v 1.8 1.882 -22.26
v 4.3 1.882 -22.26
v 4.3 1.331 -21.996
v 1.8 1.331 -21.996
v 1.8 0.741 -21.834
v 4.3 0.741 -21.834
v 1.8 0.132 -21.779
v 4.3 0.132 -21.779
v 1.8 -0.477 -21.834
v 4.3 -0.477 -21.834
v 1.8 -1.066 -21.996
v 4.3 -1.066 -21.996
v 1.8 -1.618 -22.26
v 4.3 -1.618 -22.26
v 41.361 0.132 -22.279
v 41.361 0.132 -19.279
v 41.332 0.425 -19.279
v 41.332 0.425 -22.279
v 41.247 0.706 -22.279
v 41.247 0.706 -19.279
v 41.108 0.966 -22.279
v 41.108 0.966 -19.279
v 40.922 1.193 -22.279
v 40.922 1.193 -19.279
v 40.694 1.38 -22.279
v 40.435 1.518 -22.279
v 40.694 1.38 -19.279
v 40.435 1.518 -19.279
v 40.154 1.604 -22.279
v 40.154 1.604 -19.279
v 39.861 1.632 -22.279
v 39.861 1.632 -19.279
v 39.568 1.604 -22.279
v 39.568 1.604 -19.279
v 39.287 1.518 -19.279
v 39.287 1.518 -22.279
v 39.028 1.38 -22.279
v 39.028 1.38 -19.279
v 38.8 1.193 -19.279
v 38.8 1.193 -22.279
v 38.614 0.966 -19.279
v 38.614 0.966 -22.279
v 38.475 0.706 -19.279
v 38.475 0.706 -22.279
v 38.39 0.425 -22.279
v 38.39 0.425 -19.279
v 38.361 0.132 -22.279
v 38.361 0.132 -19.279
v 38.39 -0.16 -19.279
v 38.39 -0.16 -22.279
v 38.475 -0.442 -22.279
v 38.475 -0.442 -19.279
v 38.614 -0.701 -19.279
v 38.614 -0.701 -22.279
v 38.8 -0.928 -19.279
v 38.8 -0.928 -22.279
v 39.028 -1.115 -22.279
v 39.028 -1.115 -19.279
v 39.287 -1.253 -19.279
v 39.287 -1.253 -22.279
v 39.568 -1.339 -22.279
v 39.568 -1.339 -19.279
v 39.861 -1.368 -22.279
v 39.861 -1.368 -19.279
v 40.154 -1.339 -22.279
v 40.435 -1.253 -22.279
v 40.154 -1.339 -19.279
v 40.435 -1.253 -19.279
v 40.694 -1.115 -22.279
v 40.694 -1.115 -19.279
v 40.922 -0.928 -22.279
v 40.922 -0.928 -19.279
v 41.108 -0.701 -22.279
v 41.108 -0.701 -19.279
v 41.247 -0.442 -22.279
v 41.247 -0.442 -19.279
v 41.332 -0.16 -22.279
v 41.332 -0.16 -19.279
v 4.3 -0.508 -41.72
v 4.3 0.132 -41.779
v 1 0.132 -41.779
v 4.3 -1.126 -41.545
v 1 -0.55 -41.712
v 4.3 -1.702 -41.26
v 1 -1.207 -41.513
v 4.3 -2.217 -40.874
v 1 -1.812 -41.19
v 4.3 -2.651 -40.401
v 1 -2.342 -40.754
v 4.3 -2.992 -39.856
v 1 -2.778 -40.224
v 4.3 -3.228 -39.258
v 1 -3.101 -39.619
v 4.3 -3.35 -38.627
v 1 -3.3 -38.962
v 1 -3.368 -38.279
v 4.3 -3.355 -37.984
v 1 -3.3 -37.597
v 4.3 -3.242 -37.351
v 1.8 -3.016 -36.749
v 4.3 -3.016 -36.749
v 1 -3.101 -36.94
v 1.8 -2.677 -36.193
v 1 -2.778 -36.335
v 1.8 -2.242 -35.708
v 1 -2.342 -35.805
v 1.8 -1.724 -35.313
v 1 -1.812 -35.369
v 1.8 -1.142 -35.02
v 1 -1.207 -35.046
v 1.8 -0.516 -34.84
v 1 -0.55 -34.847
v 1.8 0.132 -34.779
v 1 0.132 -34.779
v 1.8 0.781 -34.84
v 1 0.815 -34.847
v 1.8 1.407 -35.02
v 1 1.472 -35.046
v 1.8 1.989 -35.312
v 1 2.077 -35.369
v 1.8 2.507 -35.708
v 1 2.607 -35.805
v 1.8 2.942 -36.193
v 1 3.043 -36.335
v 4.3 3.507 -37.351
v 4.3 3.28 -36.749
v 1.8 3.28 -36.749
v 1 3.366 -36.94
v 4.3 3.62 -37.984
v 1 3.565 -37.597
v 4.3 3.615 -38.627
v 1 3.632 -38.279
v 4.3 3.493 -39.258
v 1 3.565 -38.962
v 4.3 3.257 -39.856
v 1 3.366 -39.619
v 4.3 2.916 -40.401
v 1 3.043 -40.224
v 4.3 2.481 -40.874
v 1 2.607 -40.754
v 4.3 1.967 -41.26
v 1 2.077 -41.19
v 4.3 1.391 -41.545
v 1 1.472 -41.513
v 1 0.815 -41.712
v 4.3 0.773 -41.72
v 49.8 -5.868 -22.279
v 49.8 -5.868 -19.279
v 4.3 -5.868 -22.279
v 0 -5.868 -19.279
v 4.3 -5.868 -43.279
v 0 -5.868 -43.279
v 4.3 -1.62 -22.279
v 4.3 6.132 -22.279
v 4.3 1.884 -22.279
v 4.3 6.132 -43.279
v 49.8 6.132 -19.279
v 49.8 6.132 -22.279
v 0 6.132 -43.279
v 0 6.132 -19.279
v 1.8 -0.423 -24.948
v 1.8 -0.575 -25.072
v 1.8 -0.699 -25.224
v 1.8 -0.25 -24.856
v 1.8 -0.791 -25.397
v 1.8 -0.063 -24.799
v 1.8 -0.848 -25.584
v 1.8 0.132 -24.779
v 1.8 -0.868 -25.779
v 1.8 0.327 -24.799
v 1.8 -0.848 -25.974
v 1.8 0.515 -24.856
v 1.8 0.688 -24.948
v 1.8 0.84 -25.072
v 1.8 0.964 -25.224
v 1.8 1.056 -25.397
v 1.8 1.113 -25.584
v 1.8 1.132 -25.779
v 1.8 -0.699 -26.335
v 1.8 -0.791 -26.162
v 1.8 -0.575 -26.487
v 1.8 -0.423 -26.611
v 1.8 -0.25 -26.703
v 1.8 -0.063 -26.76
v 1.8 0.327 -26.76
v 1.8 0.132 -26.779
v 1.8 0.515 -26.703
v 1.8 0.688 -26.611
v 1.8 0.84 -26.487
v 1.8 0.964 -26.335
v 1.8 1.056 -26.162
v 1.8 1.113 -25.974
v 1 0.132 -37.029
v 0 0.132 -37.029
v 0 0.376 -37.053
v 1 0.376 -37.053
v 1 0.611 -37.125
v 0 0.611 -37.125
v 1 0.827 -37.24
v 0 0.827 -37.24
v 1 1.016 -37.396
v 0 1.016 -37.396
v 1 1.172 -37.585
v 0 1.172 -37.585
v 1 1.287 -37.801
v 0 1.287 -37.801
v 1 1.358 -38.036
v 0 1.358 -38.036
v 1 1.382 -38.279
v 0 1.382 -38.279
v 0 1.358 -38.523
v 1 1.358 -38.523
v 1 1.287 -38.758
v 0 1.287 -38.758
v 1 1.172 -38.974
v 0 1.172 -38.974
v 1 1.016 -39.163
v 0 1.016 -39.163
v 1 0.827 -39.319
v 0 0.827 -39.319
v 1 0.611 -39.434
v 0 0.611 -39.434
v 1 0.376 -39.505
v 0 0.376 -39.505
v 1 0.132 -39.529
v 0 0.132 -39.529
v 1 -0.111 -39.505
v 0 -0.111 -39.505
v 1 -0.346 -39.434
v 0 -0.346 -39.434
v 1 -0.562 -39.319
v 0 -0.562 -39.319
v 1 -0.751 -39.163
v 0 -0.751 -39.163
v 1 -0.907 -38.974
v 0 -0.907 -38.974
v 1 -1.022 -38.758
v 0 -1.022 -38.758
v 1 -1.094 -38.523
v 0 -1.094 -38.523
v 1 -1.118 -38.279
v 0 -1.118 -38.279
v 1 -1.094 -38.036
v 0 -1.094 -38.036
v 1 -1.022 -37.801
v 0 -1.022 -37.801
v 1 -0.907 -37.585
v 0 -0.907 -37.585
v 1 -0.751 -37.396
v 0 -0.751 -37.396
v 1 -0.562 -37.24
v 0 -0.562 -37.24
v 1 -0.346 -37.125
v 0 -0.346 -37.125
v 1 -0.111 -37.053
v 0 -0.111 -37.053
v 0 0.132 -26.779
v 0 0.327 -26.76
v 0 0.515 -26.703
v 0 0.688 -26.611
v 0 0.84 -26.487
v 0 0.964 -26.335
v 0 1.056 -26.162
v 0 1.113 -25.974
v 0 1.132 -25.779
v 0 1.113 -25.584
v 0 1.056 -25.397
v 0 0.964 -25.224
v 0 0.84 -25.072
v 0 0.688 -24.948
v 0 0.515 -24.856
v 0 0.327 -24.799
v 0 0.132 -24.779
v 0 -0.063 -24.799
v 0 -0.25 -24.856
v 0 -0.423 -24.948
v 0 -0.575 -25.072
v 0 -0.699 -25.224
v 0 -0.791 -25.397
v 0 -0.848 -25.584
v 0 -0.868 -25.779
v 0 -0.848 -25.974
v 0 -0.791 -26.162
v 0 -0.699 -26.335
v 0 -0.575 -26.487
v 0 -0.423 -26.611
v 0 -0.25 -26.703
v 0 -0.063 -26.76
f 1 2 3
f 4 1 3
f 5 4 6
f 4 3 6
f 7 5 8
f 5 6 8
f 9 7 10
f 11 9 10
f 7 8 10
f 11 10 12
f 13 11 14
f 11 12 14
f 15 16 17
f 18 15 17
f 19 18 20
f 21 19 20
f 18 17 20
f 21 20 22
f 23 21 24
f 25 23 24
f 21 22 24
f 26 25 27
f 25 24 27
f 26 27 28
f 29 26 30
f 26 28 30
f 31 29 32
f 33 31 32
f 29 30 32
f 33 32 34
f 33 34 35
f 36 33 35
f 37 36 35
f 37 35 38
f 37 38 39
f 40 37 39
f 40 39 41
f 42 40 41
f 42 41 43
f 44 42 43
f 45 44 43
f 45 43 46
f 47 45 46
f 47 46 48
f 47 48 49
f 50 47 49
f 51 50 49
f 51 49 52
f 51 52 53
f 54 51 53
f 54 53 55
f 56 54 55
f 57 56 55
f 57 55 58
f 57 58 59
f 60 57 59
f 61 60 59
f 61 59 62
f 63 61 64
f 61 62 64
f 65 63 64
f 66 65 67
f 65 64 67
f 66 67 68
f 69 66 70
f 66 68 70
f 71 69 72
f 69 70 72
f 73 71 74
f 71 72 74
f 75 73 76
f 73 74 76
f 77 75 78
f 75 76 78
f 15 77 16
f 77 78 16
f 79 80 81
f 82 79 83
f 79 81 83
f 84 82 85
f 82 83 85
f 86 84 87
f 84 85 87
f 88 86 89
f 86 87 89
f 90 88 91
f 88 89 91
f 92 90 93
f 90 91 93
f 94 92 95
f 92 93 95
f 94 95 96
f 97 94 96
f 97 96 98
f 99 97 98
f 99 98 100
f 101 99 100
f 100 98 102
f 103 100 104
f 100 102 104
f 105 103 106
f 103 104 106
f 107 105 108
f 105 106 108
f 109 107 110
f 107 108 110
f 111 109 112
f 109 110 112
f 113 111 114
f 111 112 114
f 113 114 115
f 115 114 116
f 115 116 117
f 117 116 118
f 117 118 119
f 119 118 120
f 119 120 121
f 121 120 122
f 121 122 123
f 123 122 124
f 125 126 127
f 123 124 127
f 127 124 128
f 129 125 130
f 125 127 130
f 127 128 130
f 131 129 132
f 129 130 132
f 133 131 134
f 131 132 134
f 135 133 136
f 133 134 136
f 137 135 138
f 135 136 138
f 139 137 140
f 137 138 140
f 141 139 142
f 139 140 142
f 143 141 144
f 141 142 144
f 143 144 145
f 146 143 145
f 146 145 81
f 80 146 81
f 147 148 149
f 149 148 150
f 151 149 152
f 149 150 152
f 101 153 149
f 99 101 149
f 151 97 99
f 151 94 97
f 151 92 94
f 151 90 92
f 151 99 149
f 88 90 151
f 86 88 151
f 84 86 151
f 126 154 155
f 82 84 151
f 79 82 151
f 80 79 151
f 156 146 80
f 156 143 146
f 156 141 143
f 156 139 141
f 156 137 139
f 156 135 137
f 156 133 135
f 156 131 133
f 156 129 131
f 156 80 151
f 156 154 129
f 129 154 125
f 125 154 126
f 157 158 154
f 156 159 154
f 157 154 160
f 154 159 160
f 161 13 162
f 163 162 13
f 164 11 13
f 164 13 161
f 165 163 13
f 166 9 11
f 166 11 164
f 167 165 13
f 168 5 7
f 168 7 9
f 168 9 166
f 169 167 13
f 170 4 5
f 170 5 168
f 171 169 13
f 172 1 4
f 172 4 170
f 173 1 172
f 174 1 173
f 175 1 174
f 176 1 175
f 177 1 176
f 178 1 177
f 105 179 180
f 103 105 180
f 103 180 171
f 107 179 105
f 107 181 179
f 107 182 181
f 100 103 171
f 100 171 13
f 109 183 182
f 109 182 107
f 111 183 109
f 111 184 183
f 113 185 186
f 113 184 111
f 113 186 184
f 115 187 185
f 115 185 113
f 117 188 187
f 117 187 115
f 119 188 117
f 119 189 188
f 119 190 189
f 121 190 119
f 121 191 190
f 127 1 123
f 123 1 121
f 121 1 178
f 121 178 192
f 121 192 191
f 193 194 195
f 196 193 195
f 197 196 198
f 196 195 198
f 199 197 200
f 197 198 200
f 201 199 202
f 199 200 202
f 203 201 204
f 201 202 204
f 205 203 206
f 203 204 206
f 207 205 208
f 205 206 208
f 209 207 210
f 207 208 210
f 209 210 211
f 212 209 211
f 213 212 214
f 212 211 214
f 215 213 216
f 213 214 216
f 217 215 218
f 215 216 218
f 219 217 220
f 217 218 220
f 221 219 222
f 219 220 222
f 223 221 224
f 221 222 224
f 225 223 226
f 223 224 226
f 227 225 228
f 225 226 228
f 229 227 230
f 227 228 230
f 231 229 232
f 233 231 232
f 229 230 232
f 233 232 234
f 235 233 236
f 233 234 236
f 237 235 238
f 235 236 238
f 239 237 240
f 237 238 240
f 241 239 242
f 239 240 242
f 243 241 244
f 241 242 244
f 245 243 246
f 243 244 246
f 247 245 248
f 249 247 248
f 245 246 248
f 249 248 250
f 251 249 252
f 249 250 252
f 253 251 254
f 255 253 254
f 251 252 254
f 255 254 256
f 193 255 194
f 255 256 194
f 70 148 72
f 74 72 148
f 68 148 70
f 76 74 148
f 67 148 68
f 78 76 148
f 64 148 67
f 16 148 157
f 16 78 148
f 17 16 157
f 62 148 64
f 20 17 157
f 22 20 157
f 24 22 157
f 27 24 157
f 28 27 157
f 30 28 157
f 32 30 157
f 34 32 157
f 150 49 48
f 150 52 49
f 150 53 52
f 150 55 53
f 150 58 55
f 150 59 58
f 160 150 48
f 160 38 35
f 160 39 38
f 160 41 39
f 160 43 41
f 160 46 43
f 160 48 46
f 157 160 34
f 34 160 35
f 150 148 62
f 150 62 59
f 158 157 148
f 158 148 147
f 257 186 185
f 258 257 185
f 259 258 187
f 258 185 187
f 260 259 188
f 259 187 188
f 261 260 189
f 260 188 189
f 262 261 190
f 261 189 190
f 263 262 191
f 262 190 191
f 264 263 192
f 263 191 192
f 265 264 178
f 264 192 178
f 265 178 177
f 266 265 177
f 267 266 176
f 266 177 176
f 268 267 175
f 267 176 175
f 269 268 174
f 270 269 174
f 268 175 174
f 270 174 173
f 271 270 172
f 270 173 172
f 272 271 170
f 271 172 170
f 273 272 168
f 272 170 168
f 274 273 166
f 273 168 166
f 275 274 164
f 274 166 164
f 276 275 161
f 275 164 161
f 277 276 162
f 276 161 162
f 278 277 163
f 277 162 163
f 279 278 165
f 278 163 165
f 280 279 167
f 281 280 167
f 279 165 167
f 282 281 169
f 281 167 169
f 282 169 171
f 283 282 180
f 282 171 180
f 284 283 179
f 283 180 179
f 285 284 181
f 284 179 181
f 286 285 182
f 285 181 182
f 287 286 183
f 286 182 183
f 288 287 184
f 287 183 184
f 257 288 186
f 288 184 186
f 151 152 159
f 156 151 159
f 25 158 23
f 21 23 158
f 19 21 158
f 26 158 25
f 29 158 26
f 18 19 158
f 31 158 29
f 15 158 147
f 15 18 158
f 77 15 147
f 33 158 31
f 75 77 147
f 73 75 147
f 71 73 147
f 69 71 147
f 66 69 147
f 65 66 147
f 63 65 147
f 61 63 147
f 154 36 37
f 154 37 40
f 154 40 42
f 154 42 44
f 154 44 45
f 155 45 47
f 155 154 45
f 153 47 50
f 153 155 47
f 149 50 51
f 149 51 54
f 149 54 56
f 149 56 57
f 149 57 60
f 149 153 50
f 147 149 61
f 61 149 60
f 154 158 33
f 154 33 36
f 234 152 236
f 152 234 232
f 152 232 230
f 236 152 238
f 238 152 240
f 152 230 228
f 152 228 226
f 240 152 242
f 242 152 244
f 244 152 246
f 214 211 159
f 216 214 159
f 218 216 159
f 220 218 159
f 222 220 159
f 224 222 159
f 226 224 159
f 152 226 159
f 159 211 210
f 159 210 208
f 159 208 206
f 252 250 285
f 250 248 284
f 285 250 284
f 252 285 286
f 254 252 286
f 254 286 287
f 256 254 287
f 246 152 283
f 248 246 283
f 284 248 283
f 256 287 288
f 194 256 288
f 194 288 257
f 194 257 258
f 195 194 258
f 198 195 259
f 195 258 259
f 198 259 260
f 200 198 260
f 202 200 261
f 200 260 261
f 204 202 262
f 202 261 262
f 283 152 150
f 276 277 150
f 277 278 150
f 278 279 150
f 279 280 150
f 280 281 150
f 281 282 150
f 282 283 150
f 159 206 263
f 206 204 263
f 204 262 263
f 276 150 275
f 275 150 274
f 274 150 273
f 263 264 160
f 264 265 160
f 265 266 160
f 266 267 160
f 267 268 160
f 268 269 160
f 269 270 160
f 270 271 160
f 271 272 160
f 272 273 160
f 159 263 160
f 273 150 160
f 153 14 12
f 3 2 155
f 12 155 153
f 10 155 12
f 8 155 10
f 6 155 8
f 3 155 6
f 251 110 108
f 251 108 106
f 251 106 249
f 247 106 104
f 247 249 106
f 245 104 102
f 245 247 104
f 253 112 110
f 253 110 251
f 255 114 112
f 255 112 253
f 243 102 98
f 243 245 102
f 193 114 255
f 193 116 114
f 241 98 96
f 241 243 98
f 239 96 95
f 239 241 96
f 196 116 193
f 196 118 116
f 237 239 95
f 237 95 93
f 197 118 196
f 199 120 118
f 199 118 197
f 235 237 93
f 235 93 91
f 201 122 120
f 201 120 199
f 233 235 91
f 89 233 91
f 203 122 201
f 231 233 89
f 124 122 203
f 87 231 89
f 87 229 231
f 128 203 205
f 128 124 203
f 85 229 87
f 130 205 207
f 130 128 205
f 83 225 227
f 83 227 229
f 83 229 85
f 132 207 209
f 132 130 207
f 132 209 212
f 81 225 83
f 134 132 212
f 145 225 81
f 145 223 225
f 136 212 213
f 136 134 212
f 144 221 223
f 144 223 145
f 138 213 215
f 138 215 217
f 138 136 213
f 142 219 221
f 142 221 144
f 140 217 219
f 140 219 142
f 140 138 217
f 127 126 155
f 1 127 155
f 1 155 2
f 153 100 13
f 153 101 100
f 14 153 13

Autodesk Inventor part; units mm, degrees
ref_plane "YZ Plane" through (0, 0, 0) normal (1, 0, 0) x (0, 1, 0)
ref_plane "XZ Plane" through (0, 0, 0) normal (0, 1, 0) x (-1, 0, 0)
ref_plane "XY Plane" through (0, 0, 0) normal (0, 0, 1) x (1, 0, 0)
sketch "Sketch1" plane through (0, 0, 0) normal (1, 0, 0) x (0, 1, 0)
  line L0 (6.1324, -19.2794) -> (-5.8676, -19.2794)
  line L1 (-5.8676, -19.2794) -> (-5.8676, -43.2794)
  line L2 (-5.8676, -43.2794) -> (6.1324, -43.2794)
  line L3 (6.1324, -43.2794) -> (6.1324, -19.2794)
  point P0 (0, 0)
  dimension "d0" = 12
  dimension "d1" = 24
extrude "Extrusion1" add sketch "Sketch1" along normal blind 1.8
sketch "Sketch2" plane through (1.8, 0, 0) normal (1, 0, 0) x (0, 0, -1)
  circle A0 centre (38.2794, 0.1324) radius 3.5
  line L0 (43.2794, -5.8676) -> (43.2794, 6.1324) projected
  line L1 (19.2794, -5.8676) -> (43.2794, -5.8676) projected
  point P0 (0, 0)
  dimension "d4" = 7
  dimension "d5" = 5
  dimension "d6" = 6
extrude "Extrusion2" cut sketch "Sketch2" against normal blind 0.8
sketch "Sketch3" plane through (1.8, 0, 0) normal (1, 0, 0) x (0, 0, -1)
  line L0 (19.2794, 6.1324) -> (19.2794, -5.8676) projected
  line L1 (43.2794, -5.8676) -> (43.2794, 6.1324) projected
  line L2 (19.2794, 6.1324) -> (43.2794, 6.1324)
  line L3 (43.2794, 6.1324) -> (43.2794, -5.8676)
  line L4 (43.2794, -5.8676) -> (19.2794, -5.8676)
  line L5 (19.2794, -5.8676) -> (19.2794, 6.1324)
  circle A0 centre (38.2794, 0.1324) radius 3.5 projected
  circle A1 centre (38.2794, 0.1324) radius 3.5
  point P0 (0, 0)
  point P1 (43.2794, 6.1324)
extrude "Extrusion3" add sketch "Sketch3" along normal blind 2.5
sketch "Sketch4" plane through (4.3, 0, 0) normal (1, 0, 0) x (0, 0, -1)
  circle A0 centre (38.2794, 0.1324) radius 3.5 projected
  line L0 (36.7494, 3.2802) -> (22.2595, 1.8824)
  line L1 (36.7494, -3.0155) -> (22.2595, -1.6176)
  arc A1 (22.2595, 1.8824) -> (22.2595, -1.6176) centre (25.2089, 0.1324) ccw
  line L2 (43.2794, 6.1324) -> (19.2794, 6.1324) projected
  point P0 (0, 0)
  point P1 (21.7794, 0.1324)
  dimension "d15" = 1.53
  dimension "d16" = 1.53
  dimension "d17" = 16.5
  dimension "d18" = 3.5
  dimension "d19" = 6
extrude "Extrusion4" cut sketch "Sketch4" against normal blind 2.5 contours A0 L1 A1 L0
sketch "Sketch5" plane through (0, 0, 0) normal (-1, 0, 0) x (0, 0, 1)
  circle A0 centre (-38.2794, 0.1324) radius 3.5 projected
  circle A1 centre (-38.2794, 0.1324) radius 1.25
  point P0 (0, 0)
  dimension "d22" = 2.5
extrude "Extrusion5" cut sketch "Sketch5" against normal blind 2.5 contours A1
sketch "Sketch6" plane through (4.3, 0, 0) normal (1, 0, 0) x (0, 0, -1)
  line L0 (43.2794, 6.1324) -> (19.2794, 6.1324) projected
  line L1 (19.2794, -5.8676) -> (43.2794, -5.8676) projected
  line L2 (19.2794, 6.1324) -> (22.2794, 6.1324)
  line L3 (22.2794, 6.1324) -> (22.2794, -5.8676)
  line L4 (22.2794, -5.8676) -> (19.2794, -5.8676)
  line L5 (19.2794, -5.8676) -> (19.2794, 6.1324)
  point P0 (0, 0)
  point P1 (22.2794, 6.1324)
  dimension "d25" = 3
extrude "Extrusion6" add sketch "Sketch6" along normal blind 45.5
sketch "Sketch7" plane through (0, -5.8676, -19.2794) normal (0, 0, 1) x (1, 0, 0)
  circle A0 centre (39.861, 6) radius 1.5
  line L0 (49.8, 12) -> (49.8, 0) projected
  line L1 (0, 12) -> (49.8, 12) projected
  line L2 (0, 12) -> (0, 0) projected
  point P0 (0, 5.8676)
  dimension "d28" = 3
  dimension "d30" = 6
  dimension "d38" = 39.861
extrude "Extrusion7" cut sketch "Sketch7" against normal blind 40
sketch "Sketch8" plane through (1.8, 0, 0) normal (1, 0, 0) x (0, 0, -1)
  circle A0 centre (25.7794, 0.1324) radius 1
  circle A1 centre (38.2794, 0.1324) radius 1.25 projected
  point P0 (0, 0)
  dimension "d33" = 2
  dimension "d34" = 12.5
  dimension "d35" = 0
extrude "Extrusion8" cut sketch "Sketch8" against normal blind 10 contours A0
properties part number "18_2"
